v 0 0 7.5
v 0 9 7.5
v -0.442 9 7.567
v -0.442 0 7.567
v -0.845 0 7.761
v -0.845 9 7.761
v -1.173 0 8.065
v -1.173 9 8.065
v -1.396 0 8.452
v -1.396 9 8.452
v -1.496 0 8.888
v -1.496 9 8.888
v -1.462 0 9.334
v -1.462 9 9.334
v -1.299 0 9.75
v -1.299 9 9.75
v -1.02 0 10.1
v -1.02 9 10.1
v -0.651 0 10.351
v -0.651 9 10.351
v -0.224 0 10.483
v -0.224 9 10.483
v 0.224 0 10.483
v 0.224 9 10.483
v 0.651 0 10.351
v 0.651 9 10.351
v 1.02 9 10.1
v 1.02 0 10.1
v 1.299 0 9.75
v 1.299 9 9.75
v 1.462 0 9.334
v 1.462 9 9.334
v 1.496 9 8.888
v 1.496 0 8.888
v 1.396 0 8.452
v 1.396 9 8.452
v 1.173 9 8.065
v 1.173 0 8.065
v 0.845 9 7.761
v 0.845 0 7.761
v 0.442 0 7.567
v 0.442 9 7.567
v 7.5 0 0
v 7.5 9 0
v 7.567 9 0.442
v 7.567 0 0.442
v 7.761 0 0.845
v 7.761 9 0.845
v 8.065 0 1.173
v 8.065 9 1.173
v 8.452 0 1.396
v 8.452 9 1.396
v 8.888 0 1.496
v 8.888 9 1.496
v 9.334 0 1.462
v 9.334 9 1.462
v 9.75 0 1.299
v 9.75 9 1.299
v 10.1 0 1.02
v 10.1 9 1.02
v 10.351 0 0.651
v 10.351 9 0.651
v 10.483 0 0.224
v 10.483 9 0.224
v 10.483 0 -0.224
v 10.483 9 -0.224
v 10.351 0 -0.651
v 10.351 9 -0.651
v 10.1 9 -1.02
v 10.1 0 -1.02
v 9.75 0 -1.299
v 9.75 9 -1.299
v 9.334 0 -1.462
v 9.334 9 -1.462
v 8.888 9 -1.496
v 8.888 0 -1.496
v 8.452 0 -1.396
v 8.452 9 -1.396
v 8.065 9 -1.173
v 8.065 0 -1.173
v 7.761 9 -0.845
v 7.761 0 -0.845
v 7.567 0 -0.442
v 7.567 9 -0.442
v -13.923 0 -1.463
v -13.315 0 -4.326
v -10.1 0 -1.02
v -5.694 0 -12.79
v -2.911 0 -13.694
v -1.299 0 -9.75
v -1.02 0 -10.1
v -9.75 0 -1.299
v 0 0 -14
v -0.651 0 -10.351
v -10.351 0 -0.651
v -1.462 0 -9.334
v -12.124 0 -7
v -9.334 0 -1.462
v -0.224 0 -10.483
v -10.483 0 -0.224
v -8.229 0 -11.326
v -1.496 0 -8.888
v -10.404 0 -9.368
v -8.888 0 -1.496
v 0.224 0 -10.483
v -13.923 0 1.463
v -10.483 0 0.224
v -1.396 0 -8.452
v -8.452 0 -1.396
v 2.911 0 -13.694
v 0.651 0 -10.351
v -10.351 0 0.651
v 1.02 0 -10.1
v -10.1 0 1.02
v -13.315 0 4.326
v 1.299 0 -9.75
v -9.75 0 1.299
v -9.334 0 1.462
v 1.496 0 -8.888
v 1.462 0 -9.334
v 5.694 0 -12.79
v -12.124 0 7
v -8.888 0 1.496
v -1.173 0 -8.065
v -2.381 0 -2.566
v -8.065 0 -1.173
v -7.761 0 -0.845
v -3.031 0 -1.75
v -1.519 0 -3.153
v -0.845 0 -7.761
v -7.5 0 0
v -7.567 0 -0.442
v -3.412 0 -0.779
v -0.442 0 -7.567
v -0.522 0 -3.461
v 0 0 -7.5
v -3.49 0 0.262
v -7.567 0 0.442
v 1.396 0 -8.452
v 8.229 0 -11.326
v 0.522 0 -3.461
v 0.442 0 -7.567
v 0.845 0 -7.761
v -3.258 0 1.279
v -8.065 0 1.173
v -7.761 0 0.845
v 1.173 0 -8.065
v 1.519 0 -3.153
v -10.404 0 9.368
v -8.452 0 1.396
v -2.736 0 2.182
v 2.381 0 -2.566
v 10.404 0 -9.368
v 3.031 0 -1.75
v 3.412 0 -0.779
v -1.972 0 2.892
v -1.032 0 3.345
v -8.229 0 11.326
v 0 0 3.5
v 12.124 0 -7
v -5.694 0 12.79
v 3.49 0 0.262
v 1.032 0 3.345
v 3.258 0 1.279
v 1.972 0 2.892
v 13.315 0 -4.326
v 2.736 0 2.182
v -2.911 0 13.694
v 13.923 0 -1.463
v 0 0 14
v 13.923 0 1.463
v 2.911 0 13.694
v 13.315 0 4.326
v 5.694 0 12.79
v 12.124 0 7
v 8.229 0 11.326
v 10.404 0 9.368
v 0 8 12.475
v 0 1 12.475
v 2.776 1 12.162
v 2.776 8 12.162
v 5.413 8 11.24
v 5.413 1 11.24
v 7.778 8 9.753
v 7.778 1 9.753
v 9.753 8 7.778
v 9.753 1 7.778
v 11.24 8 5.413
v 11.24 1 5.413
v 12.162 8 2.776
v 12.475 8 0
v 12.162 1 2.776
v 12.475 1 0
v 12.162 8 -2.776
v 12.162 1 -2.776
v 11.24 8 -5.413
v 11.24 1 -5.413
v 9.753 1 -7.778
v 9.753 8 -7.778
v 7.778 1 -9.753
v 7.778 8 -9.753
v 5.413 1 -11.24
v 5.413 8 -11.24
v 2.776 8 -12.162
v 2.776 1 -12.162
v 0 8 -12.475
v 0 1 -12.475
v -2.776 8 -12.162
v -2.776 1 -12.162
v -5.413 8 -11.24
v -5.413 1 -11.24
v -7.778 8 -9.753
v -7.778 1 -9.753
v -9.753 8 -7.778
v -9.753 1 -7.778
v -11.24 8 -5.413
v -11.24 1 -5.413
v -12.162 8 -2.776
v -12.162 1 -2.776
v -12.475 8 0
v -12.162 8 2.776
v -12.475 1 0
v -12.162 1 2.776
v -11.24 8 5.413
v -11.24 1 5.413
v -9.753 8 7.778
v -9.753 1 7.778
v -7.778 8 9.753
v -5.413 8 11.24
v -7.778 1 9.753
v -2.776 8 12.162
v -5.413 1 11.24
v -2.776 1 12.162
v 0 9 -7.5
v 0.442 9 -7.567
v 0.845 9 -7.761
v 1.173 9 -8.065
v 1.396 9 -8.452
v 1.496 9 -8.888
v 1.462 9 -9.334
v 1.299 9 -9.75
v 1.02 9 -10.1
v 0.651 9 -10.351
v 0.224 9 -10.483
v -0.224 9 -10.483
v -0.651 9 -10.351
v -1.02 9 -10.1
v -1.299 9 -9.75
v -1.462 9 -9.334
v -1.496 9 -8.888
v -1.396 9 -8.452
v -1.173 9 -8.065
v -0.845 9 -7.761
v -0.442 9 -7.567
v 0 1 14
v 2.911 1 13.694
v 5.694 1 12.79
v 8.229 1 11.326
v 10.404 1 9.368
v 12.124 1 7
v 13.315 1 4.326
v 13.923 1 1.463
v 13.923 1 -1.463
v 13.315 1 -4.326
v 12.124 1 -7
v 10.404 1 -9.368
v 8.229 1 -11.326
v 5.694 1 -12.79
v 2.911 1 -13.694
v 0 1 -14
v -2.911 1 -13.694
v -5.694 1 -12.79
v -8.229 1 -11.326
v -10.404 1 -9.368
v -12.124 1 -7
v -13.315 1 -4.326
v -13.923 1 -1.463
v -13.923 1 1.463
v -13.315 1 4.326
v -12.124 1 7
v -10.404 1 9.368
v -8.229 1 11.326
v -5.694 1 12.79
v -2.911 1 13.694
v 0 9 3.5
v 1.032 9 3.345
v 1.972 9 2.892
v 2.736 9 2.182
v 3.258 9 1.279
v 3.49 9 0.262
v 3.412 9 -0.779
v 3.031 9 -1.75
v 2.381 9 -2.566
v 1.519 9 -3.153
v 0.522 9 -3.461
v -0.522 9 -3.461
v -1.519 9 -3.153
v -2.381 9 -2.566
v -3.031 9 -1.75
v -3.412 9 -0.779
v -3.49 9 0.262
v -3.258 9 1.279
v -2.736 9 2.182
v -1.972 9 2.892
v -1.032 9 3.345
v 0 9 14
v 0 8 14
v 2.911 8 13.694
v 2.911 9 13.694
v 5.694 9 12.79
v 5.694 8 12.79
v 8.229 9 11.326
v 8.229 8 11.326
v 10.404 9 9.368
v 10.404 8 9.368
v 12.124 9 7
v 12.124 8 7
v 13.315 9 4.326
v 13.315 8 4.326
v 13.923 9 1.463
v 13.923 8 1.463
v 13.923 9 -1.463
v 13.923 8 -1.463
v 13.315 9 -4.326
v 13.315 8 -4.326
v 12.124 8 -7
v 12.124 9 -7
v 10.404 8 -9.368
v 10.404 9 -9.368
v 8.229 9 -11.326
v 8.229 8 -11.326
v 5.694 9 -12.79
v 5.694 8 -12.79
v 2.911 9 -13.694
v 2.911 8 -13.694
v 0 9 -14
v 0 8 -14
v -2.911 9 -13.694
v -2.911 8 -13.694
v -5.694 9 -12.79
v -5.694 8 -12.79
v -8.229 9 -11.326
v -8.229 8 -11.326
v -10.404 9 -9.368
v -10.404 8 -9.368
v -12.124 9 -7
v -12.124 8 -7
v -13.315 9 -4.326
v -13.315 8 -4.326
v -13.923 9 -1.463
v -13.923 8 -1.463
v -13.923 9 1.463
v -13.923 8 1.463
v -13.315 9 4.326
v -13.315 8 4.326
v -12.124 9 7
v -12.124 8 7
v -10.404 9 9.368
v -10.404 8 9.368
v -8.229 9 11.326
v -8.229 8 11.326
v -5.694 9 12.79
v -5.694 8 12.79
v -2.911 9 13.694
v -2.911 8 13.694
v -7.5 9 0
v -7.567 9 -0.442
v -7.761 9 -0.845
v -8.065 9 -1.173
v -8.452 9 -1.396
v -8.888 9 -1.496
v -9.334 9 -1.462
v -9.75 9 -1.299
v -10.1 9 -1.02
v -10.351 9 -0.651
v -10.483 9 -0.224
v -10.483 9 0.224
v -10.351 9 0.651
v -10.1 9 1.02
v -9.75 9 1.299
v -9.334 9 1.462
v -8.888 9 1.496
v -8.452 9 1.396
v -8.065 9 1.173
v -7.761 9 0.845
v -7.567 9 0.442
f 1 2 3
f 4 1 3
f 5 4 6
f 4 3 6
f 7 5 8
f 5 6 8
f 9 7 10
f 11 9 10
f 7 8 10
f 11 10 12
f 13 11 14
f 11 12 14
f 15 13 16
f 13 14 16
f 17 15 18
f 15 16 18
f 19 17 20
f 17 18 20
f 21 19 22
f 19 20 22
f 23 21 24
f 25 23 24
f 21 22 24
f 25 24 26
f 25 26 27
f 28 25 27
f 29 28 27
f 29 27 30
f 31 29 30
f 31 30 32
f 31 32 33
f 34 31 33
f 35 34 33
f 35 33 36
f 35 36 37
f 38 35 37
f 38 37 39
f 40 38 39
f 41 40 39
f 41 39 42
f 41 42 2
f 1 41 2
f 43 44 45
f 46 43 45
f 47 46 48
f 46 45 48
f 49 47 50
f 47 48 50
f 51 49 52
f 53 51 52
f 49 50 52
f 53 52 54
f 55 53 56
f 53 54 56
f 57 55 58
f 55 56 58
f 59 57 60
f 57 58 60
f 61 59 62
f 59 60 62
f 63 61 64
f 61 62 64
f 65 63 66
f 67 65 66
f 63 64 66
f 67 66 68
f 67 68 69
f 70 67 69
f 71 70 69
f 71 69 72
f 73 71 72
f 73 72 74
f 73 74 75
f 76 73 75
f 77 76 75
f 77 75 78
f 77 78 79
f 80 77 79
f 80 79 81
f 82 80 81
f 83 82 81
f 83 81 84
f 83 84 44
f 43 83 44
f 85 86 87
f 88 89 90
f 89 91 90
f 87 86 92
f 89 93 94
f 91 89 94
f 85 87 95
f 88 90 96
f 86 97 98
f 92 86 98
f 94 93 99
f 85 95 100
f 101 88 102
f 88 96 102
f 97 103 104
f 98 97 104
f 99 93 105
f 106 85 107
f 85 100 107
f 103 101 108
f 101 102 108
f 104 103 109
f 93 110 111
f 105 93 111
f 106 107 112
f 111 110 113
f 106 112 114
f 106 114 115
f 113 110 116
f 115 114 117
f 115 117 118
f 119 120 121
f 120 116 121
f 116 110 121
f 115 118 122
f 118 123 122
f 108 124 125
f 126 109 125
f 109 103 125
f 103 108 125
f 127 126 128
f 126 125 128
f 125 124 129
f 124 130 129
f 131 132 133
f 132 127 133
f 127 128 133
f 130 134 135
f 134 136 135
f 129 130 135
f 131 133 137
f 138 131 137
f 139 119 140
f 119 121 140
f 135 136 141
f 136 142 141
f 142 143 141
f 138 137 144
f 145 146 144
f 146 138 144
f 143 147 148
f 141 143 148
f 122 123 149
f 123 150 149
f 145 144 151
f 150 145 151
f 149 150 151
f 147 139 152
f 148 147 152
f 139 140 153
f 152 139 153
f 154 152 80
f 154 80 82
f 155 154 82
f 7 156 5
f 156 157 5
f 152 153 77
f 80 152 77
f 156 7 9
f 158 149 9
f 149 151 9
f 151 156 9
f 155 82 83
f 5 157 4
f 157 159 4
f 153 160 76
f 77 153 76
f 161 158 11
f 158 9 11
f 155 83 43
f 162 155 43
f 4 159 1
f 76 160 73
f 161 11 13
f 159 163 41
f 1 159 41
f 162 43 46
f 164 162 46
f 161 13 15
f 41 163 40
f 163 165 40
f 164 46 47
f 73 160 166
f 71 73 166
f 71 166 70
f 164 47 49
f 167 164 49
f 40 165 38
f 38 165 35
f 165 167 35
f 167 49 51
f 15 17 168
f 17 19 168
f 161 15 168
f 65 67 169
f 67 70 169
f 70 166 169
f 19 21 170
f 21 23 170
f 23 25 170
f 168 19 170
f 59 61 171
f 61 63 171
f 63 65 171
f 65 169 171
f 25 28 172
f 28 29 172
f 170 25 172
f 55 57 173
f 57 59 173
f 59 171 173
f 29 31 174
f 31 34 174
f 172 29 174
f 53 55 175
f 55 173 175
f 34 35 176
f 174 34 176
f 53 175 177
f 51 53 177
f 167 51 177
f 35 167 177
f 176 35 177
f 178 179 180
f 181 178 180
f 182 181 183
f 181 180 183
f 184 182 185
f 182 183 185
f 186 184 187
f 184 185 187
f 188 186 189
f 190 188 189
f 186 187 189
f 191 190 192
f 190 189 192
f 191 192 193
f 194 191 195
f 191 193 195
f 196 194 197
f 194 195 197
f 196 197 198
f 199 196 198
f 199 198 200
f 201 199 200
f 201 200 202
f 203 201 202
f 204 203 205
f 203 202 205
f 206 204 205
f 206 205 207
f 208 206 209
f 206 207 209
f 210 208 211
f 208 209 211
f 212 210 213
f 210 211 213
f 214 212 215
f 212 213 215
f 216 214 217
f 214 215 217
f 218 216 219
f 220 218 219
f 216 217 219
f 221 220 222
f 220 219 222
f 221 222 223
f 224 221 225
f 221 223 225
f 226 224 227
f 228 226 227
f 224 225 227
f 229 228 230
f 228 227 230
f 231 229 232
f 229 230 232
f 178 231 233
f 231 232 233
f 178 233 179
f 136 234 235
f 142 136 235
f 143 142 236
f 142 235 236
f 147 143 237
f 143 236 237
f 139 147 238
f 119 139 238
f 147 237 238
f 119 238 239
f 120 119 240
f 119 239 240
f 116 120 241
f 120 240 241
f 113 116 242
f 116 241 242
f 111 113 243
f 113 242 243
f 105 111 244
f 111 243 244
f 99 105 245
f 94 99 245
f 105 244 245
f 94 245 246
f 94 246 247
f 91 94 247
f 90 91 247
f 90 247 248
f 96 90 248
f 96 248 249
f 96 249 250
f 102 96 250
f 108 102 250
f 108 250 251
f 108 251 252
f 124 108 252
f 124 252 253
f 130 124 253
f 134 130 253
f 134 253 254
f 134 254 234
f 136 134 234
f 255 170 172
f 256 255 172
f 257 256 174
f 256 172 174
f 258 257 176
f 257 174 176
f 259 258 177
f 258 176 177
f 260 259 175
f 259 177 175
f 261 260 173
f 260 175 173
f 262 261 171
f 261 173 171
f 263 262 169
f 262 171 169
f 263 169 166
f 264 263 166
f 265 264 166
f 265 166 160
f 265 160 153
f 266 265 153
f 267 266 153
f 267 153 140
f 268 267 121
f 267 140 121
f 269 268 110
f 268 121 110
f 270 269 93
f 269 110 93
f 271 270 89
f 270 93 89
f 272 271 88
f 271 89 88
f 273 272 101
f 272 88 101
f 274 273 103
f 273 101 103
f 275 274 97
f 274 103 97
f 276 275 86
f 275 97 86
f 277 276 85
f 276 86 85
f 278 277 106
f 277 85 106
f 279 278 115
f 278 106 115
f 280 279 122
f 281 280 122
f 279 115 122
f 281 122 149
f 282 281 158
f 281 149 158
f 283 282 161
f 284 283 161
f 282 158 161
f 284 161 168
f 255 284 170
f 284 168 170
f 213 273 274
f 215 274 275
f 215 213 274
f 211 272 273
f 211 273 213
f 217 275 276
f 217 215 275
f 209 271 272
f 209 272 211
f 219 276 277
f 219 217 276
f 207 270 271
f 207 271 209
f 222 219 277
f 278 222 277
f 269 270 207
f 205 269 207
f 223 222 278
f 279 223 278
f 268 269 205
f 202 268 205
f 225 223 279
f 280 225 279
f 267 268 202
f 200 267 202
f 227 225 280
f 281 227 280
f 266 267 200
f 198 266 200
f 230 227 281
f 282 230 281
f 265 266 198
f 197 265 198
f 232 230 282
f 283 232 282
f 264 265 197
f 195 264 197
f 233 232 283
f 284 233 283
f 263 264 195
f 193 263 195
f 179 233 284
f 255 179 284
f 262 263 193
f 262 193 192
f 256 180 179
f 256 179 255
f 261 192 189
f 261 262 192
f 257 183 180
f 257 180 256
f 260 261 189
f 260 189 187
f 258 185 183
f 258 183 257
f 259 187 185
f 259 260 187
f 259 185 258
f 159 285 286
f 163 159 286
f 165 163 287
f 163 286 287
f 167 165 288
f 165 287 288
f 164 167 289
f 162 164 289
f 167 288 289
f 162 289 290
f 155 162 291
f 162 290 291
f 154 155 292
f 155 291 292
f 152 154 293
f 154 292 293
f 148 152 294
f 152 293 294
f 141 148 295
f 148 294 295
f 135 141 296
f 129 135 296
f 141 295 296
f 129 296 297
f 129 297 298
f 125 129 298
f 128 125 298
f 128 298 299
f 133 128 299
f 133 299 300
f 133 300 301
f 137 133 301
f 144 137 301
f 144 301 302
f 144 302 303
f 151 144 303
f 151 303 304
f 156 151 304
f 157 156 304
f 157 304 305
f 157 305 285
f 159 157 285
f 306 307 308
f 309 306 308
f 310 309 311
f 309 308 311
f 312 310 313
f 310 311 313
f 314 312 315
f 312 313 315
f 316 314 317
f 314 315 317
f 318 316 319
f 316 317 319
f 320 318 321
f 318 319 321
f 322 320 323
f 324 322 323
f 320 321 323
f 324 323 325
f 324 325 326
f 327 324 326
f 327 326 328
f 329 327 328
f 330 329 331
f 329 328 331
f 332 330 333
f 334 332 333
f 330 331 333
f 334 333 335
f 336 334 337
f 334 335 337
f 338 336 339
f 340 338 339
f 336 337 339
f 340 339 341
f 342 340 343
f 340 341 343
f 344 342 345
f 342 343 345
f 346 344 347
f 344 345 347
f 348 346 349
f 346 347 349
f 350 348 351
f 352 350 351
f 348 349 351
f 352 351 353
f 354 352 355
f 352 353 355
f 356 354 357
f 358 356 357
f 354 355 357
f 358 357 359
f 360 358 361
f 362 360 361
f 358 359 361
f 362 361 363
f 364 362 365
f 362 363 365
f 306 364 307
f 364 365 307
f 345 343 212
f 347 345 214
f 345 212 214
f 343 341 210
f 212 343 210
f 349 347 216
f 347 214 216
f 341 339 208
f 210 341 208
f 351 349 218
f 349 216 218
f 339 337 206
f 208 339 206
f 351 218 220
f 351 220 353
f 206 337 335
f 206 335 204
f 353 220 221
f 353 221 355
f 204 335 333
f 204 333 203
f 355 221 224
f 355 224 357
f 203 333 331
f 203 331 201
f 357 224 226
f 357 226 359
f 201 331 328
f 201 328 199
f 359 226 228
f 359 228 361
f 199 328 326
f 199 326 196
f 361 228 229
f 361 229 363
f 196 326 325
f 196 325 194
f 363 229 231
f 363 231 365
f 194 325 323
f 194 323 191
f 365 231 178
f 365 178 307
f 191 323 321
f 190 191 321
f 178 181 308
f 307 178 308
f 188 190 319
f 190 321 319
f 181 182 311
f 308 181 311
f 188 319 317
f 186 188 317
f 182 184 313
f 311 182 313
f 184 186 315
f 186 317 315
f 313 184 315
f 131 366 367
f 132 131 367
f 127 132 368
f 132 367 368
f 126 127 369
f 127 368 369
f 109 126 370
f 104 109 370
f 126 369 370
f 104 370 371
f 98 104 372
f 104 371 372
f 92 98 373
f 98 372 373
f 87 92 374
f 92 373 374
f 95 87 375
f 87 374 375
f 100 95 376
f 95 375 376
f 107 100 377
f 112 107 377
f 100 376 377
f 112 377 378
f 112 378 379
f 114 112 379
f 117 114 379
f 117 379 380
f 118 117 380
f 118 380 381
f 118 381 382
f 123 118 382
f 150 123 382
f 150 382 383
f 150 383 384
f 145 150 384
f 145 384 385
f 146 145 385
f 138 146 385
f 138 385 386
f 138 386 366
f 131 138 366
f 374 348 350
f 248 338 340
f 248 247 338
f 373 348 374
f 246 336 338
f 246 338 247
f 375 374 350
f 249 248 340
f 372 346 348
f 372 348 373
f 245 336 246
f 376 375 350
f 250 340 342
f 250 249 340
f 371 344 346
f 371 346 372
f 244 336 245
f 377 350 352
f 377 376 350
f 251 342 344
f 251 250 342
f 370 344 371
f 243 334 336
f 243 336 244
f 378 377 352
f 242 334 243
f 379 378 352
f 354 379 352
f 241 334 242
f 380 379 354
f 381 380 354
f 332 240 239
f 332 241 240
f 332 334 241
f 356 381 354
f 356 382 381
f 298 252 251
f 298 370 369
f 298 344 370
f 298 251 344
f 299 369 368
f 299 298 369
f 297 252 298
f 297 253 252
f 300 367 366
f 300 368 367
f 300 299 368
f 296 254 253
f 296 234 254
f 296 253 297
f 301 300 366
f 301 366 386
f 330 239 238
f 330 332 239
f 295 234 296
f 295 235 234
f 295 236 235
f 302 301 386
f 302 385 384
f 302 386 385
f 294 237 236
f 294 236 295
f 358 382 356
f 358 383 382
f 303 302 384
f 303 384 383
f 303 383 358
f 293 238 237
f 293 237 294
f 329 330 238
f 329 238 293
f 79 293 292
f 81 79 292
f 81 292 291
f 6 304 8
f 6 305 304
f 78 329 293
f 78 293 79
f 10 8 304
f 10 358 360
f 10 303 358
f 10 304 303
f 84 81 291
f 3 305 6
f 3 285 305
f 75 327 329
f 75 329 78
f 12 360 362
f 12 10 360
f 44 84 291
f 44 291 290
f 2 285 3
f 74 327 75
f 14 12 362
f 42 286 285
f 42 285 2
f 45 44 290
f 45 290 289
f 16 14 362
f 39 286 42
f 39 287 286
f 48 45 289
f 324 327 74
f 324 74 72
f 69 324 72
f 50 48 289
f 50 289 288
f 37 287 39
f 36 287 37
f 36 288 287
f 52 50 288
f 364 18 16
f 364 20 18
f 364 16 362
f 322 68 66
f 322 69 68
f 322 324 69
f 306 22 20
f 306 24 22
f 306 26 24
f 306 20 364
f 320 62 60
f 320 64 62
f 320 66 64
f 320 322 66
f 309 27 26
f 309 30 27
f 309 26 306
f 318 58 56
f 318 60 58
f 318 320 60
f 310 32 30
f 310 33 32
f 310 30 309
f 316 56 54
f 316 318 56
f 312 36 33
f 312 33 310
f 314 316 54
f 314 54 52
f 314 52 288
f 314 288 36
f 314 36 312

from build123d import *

# Parameters (mm, degrees)
SKETCH1_R           = 14
BOSS_EXTRUDE1_DEPTH = 1
SKETCH2_R           = 12.475
BOSS_EXTRUDE2_DEPTH = 7
SKETCH3_R           = 14
BOSS_EXTRUDE3_DEPTH = 1
SKETCH4_R           = 3.5
CUT_EXTRUDE1_DEPTH  = 22.748563171
SKETCH5_R           = 1.5
CUT_EXTRUDE2_DEPTH  = 22.748563171
CIRPATTERN1_COUNT   = 4


with BuildPart() as part:
    # Sketch1 → Boss-Extrude1 (new body)
    with BuildSketch(Plane(origin=(0, 0, 0), x_dir=(1, 0, 0), z_dir=(0, 1, 0))):
        with Locations(Location((0, 0, 0), (0, 0, 270))):
            Circle(SKETCH1_R)
    extrude(amount=BOSS_EXTRUDE1_DEPTH)

    # Sketch2 → Boss-Extrude2 (add)
    with BuildSketch(Plane(origin=(0, 1, 0), x_dir=(1, 0, 0), z_dir=(0, 1, 0))):
        with Locations(Location((0, 0, 0), (0, 0, 270))):
            Circle(SKETCH2_R)
    extrude(amount=BOSS_EXTRUDE2_DEPTH)

    # Sketch3 → Boss-Extrude3 (add)
    with BuildSketch(Plane(origin=(0, 8, 0), x_dir=(1, 0, 0), z_dir=(0, 1, 0))):
        with Locations(Location((0, 0, 0), (0, 0, 270))):
            Circle(SKETCH3_R)
    extrude(amount=BOSS_EXTRUDE3_DEPTH)

    # Sketch4 → Cut-Extrude1 (cut, through all)
    with BuildSketch(Plane(origin=(0, 9, 0), x_dir=(1, 0, 0), z_dir=(0, 1, 0))):
        with Locations(Location((0, 0, 0), (0, 0, 270))):
            Circle(SKETCH4_R)
    extrude(amount=-CUT_EXTRUDE1_DEPTH, mode=Mode.SUBTRACT)

    # Sketch5 → Cut-Extrude2 (cut, through all)
    with BuildSketch(Plane(origin=(0, 9, 0), x_dir=(1, 0, 0), z_dir=(0, 1, 0))):
        with Locations(Location((0, 9, 0), (0, 0, 270))):
            Circle(SKETCH5_R)
    cut_extrude2 = extrude(amount=-CUT_EXTRUDE2_DEPTH, mode=Mode.SUBTRACT)

    # CirPattern1: Cut-Extrude2 ×4 about axis
    cirpattern1_axis = Axis((0, 0, 0), (0, 1, 0))
    for i in range(1, CIRPATTERN1_COUNT):
        add(cut_extrude2.rotate(cirpattern1_axis, i * 360 / CIRPATTERN1_COUNT), mode=Mode.SUBTRACT)


solid = part.part
